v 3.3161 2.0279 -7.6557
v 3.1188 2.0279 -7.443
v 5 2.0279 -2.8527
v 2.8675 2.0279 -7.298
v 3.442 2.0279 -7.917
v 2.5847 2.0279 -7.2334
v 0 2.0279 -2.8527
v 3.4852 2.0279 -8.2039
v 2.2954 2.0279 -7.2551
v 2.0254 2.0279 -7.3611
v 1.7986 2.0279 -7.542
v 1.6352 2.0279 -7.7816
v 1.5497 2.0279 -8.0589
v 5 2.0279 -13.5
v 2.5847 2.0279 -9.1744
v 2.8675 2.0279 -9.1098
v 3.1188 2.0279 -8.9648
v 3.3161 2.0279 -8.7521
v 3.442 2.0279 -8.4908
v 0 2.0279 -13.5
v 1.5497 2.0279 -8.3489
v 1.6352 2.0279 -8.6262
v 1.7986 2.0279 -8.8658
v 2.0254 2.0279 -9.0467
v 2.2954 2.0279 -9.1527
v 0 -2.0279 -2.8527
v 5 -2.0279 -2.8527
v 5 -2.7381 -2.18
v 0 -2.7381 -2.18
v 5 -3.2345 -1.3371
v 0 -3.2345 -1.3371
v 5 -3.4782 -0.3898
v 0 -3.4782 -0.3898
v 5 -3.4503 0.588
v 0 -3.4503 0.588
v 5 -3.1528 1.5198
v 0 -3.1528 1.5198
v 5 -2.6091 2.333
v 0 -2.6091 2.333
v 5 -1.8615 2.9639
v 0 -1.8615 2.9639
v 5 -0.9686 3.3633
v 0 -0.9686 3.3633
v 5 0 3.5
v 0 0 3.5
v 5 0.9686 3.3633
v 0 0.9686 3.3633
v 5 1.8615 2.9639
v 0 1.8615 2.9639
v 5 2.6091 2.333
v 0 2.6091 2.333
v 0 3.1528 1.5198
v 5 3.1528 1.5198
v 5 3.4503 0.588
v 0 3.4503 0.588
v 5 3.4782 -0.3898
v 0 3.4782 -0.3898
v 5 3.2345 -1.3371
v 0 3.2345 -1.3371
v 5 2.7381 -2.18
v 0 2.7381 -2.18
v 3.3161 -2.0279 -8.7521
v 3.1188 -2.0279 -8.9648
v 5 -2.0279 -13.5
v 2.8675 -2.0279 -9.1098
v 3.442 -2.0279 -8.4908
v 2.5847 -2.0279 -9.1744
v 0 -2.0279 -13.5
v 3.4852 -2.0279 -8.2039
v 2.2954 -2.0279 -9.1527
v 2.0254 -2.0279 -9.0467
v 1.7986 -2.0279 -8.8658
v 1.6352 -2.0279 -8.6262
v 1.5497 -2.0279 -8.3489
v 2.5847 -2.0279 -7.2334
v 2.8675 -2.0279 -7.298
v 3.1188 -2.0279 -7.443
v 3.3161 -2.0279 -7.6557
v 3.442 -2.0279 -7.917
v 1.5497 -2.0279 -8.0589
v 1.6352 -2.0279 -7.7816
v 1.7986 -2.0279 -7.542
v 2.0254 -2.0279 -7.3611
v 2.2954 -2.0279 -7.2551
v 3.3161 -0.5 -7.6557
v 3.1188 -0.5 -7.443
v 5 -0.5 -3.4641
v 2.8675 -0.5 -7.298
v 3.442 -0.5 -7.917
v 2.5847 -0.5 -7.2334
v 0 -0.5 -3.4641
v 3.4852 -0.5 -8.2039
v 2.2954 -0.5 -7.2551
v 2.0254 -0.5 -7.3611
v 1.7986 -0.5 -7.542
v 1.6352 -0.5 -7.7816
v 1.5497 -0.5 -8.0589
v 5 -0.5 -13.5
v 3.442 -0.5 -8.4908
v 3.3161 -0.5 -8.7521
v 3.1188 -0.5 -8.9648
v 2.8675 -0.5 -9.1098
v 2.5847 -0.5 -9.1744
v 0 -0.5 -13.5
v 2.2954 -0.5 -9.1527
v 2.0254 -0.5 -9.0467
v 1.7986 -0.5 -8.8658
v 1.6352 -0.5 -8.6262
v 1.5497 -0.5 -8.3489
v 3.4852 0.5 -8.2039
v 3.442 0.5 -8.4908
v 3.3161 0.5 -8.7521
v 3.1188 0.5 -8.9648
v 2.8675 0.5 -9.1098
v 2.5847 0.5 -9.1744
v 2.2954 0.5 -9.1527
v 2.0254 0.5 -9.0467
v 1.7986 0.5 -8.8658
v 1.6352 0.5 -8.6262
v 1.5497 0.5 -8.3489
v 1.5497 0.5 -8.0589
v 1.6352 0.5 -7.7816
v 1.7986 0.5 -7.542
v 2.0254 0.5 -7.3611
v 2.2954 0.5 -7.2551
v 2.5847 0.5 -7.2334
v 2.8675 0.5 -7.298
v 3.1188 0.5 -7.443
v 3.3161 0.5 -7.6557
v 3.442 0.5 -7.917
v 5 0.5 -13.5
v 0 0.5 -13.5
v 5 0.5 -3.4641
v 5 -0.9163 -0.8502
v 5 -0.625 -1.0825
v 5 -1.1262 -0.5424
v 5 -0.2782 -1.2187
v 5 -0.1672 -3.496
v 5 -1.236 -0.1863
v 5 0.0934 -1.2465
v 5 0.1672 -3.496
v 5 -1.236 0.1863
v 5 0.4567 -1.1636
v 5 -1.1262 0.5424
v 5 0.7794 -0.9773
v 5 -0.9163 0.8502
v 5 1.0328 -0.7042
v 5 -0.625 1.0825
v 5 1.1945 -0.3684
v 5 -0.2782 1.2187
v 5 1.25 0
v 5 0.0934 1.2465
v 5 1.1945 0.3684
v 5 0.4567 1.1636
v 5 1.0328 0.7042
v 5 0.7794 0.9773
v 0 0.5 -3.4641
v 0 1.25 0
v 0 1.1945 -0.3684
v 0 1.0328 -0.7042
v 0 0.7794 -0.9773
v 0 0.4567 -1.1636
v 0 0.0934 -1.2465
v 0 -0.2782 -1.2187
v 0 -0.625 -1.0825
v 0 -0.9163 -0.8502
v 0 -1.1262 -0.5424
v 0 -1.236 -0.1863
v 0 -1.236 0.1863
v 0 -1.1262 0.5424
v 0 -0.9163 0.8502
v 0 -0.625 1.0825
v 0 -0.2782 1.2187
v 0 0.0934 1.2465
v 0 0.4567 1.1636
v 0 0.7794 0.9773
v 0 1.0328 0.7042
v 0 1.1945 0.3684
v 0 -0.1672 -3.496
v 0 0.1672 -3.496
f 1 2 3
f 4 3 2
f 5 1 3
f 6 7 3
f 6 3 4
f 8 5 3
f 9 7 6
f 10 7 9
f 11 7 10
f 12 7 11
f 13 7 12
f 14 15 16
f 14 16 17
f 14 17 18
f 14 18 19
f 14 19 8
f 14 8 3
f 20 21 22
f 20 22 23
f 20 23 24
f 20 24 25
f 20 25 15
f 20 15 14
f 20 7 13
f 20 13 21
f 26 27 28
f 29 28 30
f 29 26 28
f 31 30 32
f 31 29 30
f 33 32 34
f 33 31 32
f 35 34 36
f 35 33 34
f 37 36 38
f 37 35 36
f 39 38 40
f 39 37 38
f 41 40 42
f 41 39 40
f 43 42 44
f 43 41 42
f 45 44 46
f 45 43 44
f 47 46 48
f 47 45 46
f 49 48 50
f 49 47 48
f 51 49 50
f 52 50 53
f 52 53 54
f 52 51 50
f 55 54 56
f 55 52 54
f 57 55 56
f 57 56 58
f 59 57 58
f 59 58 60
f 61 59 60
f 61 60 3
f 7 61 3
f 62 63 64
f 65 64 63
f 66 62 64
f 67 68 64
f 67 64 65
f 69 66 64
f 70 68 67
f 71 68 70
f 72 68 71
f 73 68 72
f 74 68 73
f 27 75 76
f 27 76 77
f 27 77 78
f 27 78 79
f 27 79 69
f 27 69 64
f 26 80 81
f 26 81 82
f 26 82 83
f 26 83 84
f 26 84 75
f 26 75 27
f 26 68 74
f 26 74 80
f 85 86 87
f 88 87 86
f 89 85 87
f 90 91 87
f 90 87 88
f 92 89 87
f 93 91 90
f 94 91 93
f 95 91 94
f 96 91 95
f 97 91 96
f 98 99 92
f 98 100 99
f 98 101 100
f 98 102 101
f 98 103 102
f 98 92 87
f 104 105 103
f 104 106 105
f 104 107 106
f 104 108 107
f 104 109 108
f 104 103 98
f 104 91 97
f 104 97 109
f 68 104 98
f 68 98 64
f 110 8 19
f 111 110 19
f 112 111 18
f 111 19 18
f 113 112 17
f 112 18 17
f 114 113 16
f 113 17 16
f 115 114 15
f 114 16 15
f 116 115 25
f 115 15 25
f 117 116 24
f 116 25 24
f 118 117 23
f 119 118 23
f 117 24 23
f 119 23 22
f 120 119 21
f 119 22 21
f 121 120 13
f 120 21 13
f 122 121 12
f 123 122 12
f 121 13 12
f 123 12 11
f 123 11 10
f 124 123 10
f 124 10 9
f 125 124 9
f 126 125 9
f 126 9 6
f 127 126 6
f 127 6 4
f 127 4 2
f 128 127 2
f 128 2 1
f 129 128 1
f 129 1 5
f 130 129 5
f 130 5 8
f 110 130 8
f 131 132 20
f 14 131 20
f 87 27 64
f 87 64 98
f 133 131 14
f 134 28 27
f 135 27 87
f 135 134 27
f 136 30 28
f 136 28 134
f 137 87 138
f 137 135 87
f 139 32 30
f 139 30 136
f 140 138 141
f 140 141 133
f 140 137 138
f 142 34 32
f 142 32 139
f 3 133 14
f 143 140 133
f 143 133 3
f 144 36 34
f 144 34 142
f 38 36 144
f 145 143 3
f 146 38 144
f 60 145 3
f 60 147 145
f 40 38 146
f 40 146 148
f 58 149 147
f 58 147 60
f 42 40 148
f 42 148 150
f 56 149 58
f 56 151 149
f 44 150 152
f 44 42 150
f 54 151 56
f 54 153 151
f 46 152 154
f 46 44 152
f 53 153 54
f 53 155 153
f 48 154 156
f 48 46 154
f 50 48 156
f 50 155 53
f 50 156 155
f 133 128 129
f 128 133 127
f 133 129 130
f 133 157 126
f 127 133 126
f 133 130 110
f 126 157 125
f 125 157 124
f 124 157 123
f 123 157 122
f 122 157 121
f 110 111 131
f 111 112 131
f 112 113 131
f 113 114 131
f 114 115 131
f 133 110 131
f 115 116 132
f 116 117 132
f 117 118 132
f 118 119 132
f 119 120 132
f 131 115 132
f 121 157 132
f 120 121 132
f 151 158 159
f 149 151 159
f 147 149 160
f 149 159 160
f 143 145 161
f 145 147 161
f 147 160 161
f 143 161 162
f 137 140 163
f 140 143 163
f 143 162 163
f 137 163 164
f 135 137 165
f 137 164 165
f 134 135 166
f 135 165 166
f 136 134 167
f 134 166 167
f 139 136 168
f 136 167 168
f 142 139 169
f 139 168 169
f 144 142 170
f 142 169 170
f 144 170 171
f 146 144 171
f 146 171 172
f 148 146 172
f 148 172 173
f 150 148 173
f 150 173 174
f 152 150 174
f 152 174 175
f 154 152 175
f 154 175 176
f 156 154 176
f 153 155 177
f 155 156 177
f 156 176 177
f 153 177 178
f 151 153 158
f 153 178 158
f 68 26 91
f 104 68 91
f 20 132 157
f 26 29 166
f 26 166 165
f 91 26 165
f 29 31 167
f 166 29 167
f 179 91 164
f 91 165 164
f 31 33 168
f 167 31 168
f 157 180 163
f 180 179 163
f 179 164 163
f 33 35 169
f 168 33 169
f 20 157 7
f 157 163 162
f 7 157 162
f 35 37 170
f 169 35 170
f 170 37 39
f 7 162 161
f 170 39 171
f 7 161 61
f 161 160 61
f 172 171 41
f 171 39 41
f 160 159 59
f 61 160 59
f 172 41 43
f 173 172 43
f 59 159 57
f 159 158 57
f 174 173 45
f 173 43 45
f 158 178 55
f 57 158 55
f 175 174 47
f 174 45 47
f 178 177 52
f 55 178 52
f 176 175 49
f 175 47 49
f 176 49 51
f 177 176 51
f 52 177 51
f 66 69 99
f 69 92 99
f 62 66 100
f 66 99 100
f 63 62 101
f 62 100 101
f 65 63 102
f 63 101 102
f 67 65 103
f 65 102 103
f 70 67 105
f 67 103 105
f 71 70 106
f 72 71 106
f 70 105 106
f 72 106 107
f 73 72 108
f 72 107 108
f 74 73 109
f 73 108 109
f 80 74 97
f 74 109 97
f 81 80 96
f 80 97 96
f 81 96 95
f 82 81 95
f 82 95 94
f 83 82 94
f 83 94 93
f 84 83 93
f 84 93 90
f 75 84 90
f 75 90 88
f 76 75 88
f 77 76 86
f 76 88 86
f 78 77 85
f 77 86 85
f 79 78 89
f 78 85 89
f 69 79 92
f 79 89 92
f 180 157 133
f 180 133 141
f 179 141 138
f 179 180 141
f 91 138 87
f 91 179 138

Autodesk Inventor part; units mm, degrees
ref_plane "YZ Plane" through (0, 0, 0) normal (1, 0, 0) x (0, 1, 0)
ref_plane "XZ Plane" through (0, 0, 0) normal (0, 1, 0) x (-1, 0, 0)
ref_plane "XY Plane" through (0, 0, 0) normal (0, 0, 1) x (1, 0, 0)
sketch "Sketch1" plane through (0, 0, 0) normal (1, 0, 0) x (0, 1, 0)
  circle A0 centre (0, 0) radius 3.5
  circle A1 centre (0, 0) radius 1.25
  line L0 (0, -3.5) -> (0.5, -3.5)
  line L1 (0.5, -3.5) -> (0.5, -13.5)
  line L2 (0.5, -13.5) -> (0, -13.5)
  line L3 (0, -13.5) -> (0, -3.5)
  line L4 (0.5, -13.5) -> (2.0279, -13.5)
  line L5 (2.0279, -13.5) -> (2.0279, -5.25)
  line L6 (2.0279, -5.25) -> (0.5, -5.25)
  line L7 (0.5, -5.25) -> (0.5, -13.5)
  line L8 (0, -3.5) -> (-0.5, -3.5)
  line L9 (-0.5, -3.5) -> (-0.5, -13.5)
  line L10 (-0.5, -13.5) -> (0, -13.5)
  line L11 (-0.5, -13.5) -> (-2.0279, -13.5)
  line L12 (-2.0279, -13.5) -> (-2.0279, -5.25)
  line L13 (-2.0279, -5.25) -> (-0.5, -5.25)
  line L14 (-0.5, -5.25) -> (-0.5, -13.5)
  line L15 (-0.5, -13.5) -> (-2.0279, -13.5)
  line L16 (-2.0279, -13.5) -> (-2.0279, -2.6024)
  line L17 (-2.0279, -2.6024) -> (-0.5, -2.6024)
  line L18 (-0.5, -2.6024) -> (-0.5, -13.5)
  line L19 (2.0279, -13.5) -> (0.5, -13.5)
  line L20 (0.5, -13.5) -> (0.5, -2.6024)
  line L21 (0.5, -2.6024) -> (2.0279, -2.6024)
  line L22 (2.0279, -2.6024) -> (2.0279, -13.5)
  dimension "d0" = 7
  dimension "d1" = 2.5
  dimension "d2" = 0.5
  dimension "d3" = 10
extrude "Extrusion1" add sketch "Sketch1" along normal blind 5 contours A0 L22 L21 L20 L18 L17 L16 | L16 L17 L18 A0 | A0 L18 L9 L13 L16 | L22 L6 L1 L20 A0 | A0 L20 L21 L22 | L13 L9 L11 L12 | L5 L4 L1 L6
sketch "Sketch3" plane through (0, 2.0279, -2.8527) normal (0, 1, 0) x (1, 0, 0)
  line L0 (0, 0) -> (5.024, 10.7024)
  circle A0 centre (2.512, 5.3512) radius 0.9732
  point P0 (0, -2.8527)
extrude "Extrusion3" cut sketch "Sketch3" against normal blind 10
properties part number "servo attachment"
